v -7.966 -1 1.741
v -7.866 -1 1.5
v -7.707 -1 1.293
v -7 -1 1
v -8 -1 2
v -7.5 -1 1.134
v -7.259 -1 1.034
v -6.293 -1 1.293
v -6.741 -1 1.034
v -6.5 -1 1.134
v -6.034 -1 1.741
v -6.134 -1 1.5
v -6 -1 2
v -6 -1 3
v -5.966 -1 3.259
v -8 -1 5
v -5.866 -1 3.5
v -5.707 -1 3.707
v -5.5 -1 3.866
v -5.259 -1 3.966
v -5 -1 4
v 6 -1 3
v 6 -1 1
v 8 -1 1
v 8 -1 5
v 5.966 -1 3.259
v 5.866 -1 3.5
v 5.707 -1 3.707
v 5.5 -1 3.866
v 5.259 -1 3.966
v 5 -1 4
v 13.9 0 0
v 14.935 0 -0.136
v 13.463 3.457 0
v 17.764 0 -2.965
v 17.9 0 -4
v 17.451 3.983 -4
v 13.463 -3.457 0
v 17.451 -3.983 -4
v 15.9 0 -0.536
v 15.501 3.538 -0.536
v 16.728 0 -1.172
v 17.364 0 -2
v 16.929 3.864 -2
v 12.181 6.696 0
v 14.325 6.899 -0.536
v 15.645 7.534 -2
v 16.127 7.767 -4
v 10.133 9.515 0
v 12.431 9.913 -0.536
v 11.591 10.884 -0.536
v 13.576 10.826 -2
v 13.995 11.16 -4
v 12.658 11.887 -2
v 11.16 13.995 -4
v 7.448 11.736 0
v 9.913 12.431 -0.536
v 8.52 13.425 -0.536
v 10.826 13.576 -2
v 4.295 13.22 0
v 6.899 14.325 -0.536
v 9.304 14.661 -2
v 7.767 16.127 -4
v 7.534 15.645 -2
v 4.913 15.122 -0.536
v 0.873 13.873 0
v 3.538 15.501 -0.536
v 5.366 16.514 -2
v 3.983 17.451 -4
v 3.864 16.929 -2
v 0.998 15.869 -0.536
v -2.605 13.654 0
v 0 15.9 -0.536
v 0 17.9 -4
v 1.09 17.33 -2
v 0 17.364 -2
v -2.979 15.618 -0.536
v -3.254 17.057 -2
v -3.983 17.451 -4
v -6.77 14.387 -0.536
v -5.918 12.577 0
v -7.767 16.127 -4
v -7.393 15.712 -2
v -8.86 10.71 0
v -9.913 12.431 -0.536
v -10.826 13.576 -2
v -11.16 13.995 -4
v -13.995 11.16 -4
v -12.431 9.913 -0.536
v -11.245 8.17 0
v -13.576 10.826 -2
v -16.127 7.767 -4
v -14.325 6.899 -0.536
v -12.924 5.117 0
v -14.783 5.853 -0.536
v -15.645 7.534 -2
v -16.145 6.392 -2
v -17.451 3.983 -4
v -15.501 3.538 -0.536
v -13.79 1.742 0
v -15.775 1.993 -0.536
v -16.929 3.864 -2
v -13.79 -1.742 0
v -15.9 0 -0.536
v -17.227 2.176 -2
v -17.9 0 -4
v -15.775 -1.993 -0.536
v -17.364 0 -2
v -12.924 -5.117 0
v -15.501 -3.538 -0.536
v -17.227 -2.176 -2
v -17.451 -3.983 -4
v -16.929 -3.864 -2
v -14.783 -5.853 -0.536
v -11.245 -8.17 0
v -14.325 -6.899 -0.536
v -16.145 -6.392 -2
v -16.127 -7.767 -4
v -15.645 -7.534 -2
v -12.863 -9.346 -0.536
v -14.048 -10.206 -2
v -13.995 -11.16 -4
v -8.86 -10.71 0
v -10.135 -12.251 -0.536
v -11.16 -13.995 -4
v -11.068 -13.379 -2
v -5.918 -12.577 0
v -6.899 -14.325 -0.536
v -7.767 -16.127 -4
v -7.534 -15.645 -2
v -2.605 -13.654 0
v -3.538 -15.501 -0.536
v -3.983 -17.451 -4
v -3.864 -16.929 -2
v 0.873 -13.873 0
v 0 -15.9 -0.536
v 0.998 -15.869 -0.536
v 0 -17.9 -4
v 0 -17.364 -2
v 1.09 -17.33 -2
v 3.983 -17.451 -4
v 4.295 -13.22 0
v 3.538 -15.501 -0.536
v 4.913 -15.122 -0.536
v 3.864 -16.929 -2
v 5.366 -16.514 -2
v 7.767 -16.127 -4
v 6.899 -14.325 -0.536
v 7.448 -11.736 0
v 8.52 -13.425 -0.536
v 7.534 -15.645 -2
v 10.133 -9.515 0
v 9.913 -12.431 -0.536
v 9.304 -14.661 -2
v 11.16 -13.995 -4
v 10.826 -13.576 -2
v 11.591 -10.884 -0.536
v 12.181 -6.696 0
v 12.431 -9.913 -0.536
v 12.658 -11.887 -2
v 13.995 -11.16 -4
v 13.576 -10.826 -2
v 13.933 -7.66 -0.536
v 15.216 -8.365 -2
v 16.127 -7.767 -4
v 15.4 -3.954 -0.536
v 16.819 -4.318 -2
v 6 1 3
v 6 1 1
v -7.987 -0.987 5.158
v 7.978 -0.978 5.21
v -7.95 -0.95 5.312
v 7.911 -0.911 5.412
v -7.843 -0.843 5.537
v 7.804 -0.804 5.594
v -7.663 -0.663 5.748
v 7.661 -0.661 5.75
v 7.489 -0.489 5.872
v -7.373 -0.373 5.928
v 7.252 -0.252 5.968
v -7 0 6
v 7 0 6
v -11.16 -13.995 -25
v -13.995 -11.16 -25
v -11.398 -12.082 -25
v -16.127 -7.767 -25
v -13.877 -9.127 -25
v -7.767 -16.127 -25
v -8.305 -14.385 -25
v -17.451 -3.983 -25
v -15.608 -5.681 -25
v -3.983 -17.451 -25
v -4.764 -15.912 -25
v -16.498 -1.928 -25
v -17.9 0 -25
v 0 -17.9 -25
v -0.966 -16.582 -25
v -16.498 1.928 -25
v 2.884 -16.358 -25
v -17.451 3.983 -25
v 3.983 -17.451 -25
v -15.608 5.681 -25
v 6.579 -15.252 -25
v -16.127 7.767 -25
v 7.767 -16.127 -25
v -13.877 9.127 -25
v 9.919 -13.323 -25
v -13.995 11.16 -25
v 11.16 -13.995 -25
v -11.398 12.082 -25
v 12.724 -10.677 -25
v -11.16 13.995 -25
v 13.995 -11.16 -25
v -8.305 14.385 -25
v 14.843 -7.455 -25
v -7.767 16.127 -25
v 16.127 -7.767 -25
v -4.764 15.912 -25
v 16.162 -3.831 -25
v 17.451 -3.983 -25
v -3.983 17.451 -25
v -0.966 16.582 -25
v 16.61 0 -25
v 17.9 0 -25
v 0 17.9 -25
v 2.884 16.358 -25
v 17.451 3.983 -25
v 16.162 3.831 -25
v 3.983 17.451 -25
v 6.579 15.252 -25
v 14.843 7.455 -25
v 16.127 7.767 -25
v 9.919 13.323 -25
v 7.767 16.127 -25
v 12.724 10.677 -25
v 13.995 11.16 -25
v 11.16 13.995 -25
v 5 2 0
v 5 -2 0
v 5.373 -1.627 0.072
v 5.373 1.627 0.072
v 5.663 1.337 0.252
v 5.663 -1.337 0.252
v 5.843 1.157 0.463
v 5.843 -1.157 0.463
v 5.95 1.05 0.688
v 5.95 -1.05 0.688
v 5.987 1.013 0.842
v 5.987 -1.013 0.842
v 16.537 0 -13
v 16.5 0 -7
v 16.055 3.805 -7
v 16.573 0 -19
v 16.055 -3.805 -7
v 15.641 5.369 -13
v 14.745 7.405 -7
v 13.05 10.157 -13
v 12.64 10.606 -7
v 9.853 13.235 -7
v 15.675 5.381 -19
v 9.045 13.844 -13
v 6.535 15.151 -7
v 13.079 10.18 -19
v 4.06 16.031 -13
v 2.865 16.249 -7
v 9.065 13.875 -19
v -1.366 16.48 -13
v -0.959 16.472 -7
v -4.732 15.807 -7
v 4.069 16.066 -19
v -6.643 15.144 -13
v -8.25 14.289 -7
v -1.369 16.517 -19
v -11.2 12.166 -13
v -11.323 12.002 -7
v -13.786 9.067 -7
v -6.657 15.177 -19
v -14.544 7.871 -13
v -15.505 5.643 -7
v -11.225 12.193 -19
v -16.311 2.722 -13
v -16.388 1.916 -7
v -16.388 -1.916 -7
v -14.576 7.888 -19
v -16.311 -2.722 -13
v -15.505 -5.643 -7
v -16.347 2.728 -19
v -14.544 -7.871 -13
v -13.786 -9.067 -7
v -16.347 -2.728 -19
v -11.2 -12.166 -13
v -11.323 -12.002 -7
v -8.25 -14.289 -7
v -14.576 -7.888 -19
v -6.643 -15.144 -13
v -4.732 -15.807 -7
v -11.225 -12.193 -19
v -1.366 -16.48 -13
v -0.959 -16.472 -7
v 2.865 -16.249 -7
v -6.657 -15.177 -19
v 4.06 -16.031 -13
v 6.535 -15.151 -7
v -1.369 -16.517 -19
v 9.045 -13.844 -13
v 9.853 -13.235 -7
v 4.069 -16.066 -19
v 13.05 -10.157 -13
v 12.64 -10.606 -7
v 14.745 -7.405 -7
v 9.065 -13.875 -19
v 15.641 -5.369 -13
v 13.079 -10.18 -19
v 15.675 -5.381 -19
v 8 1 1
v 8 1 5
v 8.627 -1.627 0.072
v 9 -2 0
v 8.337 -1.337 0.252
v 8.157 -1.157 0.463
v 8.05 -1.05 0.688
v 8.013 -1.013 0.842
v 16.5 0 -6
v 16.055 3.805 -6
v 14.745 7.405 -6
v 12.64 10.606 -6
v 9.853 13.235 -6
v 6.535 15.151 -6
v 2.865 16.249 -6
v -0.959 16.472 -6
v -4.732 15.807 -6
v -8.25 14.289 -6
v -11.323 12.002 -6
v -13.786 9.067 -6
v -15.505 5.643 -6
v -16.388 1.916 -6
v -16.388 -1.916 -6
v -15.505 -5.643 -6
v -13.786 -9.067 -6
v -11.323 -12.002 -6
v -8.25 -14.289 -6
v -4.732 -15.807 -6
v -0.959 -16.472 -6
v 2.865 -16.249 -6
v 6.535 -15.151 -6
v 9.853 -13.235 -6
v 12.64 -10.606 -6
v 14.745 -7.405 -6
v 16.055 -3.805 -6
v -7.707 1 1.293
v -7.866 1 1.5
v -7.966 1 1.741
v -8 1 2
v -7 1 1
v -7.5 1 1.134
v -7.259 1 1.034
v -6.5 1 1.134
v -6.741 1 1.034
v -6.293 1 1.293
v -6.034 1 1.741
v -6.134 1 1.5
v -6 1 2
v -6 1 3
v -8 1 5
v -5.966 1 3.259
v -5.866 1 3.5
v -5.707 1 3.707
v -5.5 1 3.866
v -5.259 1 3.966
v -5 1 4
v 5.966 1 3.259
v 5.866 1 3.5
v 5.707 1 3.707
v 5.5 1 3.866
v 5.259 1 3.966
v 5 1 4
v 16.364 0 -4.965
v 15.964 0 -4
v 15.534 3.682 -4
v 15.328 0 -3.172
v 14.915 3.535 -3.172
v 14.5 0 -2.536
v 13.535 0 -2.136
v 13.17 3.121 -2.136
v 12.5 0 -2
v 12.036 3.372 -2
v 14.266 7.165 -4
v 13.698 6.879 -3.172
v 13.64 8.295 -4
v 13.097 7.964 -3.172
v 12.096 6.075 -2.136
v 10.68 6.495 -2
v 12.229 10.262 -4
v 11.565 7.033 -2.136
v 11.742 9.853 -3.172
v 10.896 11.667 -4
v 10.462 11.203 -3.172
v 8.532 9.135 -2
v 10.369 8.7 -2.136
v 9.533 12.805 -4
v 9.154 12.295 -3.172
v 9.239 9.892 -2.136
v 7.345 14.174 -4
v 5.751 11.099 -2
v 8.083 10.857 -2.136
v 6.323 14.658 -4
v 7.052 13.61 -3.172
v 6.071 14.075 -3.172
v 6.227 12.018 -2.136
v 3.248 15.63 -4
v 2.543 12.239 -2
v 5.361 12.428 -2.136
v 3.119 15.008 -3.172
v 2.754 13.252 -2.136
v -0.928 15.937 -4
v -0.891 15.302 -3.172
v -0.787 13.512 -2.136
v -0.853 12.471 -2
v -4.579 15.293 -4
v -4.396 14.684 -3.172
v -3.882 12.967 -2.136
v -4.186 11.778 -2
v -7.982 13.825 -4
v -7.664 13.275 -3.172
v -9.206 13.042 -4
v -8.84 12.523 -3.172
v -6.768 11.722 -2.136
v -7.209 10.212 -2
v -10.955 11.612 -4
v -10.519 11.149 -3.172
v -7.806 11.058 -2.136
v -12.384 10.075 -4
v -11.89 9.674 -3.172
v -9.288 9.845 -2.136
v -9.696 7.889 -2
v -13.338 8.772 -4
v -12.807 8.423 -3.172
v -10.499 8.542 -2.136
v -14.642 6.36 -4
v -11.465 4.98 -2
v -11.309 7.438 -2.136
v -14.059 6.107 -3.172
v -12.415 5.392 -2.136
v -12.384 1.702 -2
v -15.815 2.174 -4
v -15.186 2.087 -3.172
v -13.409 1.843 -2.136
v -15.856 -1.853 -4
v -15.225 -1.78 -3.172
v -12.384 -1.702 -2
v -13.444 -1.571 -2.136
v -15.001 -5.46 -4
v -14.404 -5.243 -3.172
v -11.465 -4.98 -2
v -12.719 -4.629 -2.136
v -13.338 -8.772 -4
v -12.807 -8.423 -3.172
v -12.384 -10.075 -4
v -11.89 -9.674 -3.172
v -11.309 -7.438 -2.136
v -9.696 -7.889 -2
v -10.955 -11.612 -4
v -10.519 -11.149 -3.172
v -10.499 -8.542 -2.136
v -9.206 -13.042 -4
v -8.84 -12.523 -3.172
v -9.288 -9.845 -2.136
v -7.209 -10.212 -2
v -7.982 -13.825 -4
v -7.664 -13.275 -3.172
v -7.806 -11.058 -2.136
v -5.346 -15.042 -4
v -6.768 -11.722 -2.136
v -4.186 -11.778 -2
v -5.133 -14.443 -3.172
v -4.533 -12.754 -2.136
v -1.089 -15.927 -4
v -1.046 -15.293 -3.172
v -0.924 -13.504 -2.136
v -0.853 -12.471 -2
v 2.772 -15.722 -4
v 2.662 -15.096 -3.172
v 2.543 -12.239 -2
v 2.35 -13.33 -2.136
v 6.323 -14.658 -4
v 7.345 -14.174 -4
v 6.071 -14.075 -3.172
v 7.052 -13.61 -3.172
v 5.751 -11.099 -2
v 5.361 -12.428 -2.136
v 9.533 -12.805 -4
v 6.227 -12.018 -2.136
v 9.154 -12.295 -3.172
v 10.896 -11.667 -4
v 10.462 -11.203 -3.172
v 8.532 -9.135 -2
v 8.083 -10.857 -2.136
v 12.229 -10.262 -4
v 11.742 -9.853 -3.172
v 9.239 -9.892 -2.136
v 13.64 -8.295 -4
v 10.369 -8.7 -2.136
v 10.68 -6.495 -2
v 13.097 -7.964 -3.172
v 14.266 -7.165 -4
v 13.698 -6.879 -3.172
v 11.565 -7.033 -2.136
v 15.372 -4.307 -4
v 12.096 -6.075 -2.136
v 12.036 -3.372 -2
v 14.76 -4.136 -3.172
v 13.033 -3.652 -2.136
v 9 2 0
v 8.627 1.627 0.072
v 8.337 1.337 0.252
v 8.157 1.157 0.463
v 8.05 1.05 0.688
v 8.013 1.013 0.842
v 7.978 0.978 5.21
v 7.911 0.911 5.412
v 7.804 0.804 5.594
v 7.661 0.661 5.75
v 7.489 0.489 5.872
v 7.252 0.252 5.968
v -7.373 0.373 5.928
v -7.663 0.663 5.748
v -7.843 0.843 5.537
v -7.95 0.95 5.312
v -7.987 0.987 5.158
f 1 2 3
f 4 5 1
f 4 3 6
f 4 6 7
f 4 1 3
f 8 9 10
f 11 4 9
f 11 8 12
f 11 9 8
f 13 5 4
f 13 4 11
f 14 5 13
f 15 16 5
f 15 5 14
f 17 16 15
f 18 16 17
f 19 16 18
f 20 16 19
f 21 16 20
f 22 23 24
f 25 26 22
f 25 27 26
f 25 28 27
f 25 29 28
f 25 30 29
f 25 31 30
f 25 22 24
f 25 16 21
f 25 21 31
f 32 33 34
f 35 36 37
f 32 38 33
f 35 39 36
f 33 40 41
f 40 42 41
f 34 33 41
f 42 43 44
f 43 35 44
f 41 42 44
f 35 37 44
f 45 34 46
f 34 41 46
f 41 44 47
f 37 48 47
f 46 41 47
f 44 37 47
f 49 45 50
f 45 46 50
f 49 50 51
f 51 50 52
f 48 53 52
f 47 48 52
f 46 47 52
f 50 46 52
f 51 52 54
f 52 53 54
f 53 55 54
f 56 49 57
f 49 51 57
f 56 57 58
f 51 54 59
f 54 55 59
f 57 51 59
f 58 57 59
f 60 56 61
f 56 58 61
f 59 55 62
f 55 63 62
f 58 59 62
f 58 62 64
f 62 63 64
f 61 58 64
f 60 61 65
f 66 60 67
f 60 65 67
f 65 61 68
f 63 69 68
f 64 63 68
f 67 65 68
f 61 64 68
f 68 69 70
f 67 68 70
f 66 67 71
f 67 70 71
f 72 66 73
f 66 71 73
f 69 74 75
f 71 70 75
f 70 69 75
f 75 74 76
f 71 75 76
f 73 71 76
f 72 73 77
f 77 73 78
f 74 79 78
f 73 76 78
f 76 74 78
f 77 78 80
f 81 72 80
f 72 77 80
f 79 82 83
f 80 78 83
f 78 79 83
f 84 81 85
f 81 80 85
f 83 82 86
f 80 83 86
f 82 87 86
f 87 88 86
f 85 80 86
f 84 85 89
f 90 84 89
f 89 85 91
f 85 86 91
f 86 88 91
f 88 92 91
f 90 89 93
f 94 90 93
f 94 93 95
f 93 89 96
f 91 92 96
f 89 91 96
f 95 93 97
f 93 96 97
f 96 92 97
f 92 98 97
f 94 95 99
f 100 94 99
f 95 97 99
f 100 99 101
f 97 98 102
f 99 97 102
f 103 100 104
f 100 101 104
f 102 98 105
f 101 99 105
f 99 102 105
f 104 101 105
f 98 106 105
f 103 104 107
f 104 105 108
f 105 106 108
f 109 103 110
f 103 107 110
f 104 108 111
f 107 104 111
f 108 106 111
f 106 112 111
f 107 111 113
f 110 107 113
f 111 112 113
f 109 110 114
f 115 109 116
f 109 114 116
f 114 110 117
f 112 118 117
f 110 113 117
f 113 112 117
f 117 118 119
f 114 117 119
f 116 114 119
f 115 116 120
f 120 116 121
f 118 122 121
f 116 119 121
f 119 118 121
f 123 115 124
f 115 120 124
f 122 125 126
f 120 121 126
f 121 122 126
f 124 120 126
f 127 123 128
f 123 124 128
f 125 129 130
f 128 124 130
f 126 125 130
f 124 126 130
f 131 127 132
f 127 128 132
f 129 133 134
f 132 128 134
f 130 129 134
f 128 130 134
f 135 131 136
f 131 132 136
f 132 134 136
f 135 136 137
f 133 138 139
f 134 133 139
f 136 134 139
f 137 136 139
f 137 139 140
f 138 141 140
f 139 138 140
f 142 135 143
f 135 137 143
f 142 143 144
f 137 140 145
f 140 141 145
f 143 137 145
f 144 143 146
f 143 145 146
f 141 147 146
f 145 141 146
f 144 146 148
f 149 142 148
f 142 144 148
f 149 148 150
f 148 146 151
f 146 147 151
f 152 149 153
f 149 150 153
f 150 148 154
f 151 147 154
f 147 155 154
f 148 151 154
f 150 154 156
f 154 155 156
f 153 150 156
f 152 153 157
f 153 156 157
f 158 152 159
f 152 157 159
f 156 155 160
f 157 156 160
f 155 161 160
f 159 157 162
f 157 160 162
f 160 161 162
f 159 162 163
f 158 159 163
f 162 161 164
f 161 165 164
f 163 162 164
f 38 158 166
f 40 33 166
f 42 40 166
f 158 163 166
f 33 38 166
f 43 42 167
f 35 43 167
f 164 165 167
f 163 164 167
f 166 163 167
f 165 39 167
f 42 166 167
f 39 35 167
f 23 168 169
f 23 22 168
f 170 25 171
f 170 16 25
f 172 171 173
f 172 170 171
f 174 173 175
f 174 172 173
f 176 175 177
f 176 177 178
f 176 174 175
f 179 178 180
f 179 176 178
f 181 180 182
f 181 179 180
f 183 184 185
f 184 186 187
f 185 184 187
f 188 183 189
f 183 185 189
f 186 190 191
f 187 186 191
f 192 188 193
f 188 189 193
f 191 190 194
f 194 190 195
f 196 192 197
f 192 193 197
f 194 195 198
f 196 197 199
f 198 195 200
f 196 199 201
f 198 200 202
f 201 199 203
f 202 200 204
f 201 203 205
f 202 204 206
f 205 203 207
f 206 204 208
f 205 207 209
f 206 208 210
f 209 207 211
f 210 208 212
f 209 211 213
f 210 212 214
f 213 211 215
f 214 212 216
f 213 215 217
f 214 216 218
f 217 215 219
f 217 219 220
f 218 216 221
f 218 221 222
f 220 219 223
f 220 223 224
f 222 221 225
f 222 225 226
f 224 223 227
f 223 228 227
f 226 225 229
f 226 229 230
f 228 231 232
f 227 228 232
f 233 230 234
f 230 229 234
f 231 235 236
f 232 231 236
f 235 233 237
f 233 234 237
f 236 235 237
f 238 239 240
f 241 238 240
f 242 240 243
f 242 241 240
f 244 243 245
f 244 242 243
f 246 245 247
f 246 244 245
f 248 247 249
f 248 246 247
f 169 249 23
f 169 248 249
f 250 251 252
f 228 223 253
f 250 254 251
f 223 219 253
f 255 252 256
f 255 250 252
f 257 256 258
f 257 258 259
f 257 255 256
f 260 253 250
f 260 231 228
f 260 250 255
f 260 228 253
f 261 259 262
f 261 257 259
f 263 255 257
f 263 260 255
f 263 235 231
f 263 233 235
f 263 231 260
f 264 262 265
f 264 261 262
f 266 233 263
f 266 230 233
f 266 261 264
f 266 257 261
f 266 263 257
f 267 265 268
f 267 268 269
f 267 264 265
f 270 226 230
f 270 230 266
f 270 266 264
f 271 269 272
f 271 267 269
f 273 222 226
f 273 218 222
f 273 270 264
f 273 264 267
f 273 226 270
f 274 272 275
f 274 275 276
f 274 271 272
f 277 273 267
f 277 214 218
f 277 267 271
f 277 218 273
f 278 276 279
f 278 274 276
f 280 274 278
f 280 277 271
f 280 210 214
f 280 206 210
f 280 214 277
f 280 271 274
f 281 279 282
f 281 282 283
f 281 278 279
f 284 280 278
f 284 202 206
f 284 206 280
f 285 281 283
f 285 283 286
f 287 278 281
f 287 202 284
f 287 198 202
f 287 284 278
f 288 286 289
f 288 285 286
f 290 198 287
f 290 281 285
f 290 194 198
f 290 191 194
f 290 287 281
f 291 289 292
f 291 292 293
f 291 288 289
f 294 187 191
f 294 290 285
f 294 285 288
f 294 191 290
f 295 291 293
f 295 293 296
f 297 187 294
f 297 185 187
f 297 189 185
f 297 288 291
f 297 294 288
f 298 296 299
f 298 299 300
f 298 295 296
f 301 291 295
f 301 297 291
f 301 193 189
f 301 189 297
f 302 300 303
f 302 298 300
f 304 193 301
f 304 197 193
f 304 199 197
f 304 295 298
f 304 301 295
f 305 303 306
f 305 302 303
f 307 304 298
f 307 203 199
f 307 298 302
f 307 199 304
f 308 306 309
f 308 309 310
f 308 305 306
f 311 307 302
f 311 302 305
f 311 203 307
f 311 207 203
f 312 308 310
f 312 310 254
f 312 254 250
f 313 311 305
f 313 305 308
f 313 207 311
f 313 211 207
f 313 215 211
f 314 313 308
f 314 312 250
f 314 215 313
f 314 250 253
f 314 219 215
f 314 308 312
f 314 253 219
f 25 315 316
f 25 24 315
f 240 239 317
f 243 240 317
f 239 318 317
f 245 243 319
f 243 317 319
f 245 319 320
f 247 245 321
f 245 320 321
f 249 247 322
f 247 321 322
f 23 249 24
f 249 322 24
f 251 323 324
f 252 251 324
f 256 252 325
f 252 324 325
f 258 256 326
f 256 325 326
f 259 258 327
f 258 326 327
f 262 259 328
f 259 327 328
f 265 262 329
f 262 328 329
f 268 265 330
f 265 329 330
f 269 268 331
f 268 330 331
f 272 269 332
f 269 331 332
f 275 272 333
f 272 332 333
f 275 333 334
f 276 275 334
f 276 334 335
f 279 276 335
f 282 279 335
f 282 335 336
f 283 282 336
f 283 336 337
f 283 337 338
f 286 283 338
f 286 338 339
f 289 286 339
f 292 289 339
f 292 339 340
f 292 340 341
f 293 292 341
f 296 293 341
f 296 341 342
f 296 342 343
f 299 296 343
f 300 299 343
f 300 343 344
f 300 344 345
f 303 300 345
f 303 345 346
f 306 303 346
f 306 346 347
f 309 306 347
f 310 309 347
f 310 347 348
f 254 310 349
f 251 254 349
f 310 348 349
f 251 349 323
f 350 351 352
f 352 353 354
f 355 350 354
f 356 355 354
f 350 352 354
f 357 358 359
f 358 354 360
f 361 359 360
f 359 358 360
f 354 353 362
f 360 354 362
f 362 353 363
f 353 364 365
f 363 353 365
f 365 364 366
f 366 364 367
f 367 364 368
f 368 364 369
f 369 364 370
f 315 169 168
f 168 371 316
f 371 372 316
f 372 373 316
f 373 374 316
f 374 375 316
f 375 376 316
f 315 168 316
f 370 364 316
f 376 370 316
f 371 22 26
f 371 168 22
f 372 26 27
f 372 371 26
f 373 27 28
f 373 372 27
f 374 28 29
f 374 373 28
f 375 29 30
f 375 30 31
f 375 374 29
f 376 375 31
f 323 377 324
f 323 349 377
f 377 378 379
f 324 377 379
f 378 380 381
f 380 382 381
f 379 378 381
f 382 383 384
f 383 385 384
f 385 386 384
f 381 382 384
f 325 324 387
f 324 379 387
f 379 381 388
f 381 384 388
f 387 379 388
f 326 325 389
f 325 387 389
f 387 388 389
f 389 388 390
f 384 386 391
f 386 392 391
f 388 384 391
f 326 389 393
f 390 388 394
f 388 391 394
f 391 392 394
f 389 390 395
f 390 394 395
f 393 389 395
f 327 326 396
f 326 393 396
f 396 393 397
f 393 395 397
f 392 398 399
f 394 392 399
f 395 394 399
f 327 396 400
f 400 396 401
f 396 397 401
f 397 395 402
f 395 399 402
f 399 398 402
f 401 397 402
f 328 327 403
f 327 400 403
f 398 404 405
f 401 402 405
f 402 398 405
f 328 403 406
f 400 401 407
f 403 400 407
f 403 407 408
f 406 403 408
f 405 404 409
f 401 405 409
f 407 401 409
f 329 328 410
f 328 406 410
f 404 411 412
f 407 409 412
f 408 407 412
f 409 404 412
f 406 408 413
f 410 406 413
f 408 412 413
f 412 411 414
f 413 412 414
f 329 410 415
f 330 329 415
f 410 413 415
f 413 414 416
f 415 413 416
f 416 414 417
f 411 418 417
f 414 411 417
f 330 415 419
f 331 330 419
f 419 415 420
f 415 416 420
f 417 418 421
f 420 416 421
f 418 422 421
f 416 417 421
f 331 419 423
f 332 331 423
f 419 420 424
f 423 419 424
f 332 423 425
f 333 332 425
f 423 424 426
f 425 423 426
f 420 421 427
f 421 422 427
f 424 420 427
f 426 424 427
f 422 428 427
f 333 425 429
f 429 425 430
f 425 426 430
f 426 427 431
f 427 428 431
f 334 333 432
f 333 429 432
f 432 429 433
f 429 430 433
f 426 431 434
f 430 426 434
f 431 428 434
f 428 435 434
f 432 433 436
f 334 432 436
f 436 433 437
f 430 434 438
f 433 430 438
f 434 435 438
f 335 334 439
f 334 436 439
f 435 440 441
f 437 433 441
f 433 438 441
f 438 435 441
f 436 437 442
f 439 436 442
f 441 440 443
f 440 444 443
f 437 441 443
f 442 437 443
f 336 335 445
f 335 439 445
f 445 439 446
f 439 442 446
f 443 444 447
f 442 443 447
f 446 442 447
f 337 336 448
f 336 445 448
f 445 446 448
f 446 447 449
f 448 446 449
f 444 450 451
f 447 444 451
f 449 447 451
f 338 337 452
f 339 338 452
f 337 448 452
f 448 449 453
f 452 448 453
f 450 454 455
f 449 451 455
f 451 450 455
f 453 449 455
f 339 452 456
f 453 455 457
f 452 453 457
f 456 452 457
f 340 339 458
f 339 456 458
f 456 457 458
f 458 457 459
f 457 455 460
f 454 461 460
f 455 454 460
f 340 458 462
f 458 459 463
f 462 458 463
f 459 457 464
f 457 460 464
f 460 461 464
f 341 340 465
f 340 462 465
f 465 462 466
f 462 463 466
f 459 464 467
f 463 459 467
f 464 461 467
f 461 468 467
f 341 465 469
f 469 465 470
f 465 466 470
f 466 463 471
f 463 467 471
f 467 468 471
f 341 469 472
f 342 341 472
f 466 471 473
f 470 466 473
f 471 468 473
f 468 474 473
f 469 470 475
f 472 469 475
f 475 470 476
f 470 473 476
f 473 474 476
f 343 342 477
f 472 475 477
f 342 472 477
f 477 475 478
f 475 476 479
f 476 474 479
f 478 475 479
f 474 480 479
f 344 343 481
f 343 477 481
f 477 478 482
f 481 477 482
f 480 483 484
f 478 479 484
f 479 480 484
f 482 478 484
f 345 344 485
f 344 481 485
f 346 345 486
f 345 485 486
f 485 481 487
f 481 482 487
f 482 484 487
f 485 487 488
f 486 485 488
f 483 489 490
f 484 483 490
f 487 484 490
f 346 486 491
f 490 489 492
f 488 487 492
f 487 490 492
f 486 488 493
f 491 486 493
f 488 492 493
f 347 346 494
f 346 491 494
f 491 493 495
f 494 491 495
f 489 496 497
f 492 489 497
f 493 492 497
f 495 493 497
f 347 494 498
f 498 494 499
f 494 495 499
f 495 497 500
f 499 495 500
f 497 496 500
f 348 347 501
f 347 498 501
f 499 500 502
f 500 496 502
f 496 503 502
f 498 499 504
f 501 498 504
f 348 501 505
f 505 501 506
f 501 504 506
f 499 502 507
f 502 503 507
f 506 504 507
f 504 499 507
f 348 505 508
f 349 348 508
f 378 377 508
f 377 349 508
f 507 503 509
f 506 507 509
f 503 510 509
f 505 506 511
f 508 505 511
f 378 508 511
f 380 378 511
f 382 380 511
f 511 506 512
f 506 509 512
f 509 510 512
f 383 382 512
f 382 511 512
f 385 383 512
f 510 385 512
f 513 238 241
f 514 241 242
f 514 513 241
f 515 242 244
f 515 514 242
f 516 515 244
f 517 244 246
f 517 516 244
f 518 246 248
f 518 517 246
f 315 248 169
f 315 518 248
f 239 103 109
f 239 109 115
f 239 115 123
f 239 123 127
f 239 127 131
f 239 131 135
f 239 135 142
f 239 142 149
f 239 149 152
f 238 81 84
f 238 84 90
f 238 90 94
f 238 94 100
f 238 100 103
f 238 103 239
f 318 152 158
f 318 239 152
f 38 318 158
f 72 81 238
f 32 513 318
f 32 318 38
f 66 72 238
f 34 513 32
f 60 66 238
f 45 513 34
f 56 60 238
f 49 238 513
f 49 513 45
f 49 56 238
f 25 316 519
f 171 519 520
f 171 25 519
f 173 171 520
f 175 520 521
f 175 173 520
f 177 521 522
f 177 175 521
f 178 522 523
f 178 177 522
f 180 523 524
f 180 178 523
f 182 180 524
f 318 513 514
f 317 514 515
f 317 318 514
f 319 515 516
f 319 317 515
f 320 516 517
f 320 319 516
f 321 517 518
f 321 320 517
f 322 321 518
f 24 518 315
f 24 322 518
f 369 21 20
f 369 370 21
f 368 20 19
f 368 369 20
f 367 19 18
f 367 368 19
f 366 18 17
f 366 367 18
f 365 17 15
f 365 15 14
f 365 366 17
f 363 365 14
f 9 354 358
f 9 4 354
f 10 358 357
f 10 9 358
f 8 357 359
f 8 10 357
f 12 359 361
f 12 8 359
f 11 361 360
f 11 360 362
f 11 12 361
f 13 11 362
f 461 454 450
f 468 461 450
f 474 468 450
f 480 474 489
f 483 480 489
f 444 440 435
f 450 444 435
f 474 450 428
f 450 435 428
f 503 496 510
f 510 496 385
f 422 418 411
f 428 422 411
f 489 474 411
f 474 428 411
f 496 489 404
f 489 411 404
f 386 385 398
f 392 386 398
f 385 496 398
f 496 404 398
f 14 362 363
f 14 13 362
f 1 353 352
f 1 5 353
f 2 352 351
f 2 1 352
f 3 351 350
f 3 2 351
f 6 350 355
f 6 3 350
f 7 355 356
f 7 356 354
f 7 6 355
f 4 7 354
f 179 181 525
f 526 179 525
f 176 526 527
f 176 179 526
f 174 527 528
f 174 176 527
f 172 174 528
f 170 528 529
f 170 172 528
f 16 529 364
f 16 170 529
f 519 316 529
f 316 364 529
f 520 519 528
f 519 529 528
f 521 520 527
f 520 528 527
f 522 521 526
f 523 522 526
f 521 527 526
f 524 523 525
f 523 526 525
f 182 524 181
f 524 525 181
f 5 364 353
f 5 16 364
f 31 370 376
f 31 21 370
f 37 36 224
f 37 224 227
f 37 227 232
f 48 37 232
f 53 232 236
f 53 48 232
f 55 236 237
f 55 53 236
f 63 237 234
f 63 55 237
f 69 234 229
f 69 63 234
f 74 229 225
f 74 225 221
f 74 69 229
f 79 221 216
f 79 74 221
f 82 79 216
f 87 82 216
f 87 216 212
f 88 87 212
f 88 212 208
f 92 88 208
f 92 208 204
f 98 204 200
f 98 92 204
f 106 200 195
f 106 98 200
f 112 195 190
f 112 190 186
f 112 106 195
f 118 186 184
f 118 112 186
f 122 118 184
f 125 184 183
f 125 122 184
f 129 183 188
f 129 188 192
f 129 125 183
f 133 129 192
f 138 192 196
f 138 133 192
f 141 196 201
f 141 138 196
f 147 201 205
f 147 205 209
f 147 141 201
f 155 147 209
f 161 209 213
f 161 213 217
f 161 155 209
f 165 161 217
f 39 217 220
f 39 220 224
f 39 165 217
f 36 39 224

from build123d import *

# Parameters (mm, degrees)
F0_R     = 17.9
F0_R_2   = 16.5
F1_DEPTH = 25
F3_DEPTH = 2
F4_W     = 2
F4_H     = 3
F4_H_2   = 2
F5_DEPTH = 1
F6_R     = 0.99999
F7_R     = 4
F8_SIZE2 = 0.1099571106
F8_SIZE  = 18


# Not quite as in the source:
# - a fillet or chamfer is up to 0.001 mm smaller than in the source, because OpenCascade refuses the exact size


with BuildPart() as f1:
    # F0 (on Top) → F1 (new body)
    with BuildSketch(Plane.XY):
        Circle(F0_R)
        Circle(F0_R_2, mode=Mode.SUBTRACT)
    extrude(amount=-F1_DEPTH)

    # F0 (on Top) → F3 (join)
    with BuildSketch(Plane.XY):
        Circle(F0_R_2)
    extrude(amount=-F3_DEPTH)

    # F4 (on face) → F5 (join, symmetric)
    with BuildSketch(Plane.XZ):
        Polygon((6, 4), (6, 0), (8, 0), (8, 6), (6, 6), align=None)
        with Locations((-7, 2.5)):
            Rectangle(F4_W, F4_H)
        with Locations((-7, 5)):
            Rectangle(F4_W, F4_H_2)
        Polygon((-4, 4), (6, 4), (6, 6), (-6, 6), (-6, 4), align=None)
    extrude(amount=F5_DEPTH, both=True)

    # F6 (radius 1 in the source; OpenCascade refuses exactly that, so slightly less here)
    f6_edges = [f1.edges().sort_by_distance(p)[0] for p in [
        (8, 0, 0),
        (7, -1, 0),
        (7, 1, 0),
        (6, 0, 4),
        (-6, 0, 4),
        (8, 0, 6),
        (-8, 0, 6),
        (6, 0, 0),
        (-8, 0, 1),
        (-6, 0, 1),
        (0, -1, 6),
        (0, 1, 6),
    ]]
    fillet(f6_edges, radius=F6_R)

    # F7
    f7_edges = [f1.edges().sort_by_distance(p)[0] for p in [
        (-17.9, 0, 0),
        (-16.5, 0, -2),
    ]]
    fillet(f7_edges, radius=F7_R)

    # F8
    f8_edges = [f1.edges().sort_by_distance(p)[0] for p in [
        (-16.5, 0, -25),
    ]]
    f8_side = f1.faces().sort_by_distance((-16.5, 0, -15.5))[0]
    chamfer(f8_edges, length=F8_SIZE, length2=F8_SIZE2, reference=f8_side)


solid = f1.part
